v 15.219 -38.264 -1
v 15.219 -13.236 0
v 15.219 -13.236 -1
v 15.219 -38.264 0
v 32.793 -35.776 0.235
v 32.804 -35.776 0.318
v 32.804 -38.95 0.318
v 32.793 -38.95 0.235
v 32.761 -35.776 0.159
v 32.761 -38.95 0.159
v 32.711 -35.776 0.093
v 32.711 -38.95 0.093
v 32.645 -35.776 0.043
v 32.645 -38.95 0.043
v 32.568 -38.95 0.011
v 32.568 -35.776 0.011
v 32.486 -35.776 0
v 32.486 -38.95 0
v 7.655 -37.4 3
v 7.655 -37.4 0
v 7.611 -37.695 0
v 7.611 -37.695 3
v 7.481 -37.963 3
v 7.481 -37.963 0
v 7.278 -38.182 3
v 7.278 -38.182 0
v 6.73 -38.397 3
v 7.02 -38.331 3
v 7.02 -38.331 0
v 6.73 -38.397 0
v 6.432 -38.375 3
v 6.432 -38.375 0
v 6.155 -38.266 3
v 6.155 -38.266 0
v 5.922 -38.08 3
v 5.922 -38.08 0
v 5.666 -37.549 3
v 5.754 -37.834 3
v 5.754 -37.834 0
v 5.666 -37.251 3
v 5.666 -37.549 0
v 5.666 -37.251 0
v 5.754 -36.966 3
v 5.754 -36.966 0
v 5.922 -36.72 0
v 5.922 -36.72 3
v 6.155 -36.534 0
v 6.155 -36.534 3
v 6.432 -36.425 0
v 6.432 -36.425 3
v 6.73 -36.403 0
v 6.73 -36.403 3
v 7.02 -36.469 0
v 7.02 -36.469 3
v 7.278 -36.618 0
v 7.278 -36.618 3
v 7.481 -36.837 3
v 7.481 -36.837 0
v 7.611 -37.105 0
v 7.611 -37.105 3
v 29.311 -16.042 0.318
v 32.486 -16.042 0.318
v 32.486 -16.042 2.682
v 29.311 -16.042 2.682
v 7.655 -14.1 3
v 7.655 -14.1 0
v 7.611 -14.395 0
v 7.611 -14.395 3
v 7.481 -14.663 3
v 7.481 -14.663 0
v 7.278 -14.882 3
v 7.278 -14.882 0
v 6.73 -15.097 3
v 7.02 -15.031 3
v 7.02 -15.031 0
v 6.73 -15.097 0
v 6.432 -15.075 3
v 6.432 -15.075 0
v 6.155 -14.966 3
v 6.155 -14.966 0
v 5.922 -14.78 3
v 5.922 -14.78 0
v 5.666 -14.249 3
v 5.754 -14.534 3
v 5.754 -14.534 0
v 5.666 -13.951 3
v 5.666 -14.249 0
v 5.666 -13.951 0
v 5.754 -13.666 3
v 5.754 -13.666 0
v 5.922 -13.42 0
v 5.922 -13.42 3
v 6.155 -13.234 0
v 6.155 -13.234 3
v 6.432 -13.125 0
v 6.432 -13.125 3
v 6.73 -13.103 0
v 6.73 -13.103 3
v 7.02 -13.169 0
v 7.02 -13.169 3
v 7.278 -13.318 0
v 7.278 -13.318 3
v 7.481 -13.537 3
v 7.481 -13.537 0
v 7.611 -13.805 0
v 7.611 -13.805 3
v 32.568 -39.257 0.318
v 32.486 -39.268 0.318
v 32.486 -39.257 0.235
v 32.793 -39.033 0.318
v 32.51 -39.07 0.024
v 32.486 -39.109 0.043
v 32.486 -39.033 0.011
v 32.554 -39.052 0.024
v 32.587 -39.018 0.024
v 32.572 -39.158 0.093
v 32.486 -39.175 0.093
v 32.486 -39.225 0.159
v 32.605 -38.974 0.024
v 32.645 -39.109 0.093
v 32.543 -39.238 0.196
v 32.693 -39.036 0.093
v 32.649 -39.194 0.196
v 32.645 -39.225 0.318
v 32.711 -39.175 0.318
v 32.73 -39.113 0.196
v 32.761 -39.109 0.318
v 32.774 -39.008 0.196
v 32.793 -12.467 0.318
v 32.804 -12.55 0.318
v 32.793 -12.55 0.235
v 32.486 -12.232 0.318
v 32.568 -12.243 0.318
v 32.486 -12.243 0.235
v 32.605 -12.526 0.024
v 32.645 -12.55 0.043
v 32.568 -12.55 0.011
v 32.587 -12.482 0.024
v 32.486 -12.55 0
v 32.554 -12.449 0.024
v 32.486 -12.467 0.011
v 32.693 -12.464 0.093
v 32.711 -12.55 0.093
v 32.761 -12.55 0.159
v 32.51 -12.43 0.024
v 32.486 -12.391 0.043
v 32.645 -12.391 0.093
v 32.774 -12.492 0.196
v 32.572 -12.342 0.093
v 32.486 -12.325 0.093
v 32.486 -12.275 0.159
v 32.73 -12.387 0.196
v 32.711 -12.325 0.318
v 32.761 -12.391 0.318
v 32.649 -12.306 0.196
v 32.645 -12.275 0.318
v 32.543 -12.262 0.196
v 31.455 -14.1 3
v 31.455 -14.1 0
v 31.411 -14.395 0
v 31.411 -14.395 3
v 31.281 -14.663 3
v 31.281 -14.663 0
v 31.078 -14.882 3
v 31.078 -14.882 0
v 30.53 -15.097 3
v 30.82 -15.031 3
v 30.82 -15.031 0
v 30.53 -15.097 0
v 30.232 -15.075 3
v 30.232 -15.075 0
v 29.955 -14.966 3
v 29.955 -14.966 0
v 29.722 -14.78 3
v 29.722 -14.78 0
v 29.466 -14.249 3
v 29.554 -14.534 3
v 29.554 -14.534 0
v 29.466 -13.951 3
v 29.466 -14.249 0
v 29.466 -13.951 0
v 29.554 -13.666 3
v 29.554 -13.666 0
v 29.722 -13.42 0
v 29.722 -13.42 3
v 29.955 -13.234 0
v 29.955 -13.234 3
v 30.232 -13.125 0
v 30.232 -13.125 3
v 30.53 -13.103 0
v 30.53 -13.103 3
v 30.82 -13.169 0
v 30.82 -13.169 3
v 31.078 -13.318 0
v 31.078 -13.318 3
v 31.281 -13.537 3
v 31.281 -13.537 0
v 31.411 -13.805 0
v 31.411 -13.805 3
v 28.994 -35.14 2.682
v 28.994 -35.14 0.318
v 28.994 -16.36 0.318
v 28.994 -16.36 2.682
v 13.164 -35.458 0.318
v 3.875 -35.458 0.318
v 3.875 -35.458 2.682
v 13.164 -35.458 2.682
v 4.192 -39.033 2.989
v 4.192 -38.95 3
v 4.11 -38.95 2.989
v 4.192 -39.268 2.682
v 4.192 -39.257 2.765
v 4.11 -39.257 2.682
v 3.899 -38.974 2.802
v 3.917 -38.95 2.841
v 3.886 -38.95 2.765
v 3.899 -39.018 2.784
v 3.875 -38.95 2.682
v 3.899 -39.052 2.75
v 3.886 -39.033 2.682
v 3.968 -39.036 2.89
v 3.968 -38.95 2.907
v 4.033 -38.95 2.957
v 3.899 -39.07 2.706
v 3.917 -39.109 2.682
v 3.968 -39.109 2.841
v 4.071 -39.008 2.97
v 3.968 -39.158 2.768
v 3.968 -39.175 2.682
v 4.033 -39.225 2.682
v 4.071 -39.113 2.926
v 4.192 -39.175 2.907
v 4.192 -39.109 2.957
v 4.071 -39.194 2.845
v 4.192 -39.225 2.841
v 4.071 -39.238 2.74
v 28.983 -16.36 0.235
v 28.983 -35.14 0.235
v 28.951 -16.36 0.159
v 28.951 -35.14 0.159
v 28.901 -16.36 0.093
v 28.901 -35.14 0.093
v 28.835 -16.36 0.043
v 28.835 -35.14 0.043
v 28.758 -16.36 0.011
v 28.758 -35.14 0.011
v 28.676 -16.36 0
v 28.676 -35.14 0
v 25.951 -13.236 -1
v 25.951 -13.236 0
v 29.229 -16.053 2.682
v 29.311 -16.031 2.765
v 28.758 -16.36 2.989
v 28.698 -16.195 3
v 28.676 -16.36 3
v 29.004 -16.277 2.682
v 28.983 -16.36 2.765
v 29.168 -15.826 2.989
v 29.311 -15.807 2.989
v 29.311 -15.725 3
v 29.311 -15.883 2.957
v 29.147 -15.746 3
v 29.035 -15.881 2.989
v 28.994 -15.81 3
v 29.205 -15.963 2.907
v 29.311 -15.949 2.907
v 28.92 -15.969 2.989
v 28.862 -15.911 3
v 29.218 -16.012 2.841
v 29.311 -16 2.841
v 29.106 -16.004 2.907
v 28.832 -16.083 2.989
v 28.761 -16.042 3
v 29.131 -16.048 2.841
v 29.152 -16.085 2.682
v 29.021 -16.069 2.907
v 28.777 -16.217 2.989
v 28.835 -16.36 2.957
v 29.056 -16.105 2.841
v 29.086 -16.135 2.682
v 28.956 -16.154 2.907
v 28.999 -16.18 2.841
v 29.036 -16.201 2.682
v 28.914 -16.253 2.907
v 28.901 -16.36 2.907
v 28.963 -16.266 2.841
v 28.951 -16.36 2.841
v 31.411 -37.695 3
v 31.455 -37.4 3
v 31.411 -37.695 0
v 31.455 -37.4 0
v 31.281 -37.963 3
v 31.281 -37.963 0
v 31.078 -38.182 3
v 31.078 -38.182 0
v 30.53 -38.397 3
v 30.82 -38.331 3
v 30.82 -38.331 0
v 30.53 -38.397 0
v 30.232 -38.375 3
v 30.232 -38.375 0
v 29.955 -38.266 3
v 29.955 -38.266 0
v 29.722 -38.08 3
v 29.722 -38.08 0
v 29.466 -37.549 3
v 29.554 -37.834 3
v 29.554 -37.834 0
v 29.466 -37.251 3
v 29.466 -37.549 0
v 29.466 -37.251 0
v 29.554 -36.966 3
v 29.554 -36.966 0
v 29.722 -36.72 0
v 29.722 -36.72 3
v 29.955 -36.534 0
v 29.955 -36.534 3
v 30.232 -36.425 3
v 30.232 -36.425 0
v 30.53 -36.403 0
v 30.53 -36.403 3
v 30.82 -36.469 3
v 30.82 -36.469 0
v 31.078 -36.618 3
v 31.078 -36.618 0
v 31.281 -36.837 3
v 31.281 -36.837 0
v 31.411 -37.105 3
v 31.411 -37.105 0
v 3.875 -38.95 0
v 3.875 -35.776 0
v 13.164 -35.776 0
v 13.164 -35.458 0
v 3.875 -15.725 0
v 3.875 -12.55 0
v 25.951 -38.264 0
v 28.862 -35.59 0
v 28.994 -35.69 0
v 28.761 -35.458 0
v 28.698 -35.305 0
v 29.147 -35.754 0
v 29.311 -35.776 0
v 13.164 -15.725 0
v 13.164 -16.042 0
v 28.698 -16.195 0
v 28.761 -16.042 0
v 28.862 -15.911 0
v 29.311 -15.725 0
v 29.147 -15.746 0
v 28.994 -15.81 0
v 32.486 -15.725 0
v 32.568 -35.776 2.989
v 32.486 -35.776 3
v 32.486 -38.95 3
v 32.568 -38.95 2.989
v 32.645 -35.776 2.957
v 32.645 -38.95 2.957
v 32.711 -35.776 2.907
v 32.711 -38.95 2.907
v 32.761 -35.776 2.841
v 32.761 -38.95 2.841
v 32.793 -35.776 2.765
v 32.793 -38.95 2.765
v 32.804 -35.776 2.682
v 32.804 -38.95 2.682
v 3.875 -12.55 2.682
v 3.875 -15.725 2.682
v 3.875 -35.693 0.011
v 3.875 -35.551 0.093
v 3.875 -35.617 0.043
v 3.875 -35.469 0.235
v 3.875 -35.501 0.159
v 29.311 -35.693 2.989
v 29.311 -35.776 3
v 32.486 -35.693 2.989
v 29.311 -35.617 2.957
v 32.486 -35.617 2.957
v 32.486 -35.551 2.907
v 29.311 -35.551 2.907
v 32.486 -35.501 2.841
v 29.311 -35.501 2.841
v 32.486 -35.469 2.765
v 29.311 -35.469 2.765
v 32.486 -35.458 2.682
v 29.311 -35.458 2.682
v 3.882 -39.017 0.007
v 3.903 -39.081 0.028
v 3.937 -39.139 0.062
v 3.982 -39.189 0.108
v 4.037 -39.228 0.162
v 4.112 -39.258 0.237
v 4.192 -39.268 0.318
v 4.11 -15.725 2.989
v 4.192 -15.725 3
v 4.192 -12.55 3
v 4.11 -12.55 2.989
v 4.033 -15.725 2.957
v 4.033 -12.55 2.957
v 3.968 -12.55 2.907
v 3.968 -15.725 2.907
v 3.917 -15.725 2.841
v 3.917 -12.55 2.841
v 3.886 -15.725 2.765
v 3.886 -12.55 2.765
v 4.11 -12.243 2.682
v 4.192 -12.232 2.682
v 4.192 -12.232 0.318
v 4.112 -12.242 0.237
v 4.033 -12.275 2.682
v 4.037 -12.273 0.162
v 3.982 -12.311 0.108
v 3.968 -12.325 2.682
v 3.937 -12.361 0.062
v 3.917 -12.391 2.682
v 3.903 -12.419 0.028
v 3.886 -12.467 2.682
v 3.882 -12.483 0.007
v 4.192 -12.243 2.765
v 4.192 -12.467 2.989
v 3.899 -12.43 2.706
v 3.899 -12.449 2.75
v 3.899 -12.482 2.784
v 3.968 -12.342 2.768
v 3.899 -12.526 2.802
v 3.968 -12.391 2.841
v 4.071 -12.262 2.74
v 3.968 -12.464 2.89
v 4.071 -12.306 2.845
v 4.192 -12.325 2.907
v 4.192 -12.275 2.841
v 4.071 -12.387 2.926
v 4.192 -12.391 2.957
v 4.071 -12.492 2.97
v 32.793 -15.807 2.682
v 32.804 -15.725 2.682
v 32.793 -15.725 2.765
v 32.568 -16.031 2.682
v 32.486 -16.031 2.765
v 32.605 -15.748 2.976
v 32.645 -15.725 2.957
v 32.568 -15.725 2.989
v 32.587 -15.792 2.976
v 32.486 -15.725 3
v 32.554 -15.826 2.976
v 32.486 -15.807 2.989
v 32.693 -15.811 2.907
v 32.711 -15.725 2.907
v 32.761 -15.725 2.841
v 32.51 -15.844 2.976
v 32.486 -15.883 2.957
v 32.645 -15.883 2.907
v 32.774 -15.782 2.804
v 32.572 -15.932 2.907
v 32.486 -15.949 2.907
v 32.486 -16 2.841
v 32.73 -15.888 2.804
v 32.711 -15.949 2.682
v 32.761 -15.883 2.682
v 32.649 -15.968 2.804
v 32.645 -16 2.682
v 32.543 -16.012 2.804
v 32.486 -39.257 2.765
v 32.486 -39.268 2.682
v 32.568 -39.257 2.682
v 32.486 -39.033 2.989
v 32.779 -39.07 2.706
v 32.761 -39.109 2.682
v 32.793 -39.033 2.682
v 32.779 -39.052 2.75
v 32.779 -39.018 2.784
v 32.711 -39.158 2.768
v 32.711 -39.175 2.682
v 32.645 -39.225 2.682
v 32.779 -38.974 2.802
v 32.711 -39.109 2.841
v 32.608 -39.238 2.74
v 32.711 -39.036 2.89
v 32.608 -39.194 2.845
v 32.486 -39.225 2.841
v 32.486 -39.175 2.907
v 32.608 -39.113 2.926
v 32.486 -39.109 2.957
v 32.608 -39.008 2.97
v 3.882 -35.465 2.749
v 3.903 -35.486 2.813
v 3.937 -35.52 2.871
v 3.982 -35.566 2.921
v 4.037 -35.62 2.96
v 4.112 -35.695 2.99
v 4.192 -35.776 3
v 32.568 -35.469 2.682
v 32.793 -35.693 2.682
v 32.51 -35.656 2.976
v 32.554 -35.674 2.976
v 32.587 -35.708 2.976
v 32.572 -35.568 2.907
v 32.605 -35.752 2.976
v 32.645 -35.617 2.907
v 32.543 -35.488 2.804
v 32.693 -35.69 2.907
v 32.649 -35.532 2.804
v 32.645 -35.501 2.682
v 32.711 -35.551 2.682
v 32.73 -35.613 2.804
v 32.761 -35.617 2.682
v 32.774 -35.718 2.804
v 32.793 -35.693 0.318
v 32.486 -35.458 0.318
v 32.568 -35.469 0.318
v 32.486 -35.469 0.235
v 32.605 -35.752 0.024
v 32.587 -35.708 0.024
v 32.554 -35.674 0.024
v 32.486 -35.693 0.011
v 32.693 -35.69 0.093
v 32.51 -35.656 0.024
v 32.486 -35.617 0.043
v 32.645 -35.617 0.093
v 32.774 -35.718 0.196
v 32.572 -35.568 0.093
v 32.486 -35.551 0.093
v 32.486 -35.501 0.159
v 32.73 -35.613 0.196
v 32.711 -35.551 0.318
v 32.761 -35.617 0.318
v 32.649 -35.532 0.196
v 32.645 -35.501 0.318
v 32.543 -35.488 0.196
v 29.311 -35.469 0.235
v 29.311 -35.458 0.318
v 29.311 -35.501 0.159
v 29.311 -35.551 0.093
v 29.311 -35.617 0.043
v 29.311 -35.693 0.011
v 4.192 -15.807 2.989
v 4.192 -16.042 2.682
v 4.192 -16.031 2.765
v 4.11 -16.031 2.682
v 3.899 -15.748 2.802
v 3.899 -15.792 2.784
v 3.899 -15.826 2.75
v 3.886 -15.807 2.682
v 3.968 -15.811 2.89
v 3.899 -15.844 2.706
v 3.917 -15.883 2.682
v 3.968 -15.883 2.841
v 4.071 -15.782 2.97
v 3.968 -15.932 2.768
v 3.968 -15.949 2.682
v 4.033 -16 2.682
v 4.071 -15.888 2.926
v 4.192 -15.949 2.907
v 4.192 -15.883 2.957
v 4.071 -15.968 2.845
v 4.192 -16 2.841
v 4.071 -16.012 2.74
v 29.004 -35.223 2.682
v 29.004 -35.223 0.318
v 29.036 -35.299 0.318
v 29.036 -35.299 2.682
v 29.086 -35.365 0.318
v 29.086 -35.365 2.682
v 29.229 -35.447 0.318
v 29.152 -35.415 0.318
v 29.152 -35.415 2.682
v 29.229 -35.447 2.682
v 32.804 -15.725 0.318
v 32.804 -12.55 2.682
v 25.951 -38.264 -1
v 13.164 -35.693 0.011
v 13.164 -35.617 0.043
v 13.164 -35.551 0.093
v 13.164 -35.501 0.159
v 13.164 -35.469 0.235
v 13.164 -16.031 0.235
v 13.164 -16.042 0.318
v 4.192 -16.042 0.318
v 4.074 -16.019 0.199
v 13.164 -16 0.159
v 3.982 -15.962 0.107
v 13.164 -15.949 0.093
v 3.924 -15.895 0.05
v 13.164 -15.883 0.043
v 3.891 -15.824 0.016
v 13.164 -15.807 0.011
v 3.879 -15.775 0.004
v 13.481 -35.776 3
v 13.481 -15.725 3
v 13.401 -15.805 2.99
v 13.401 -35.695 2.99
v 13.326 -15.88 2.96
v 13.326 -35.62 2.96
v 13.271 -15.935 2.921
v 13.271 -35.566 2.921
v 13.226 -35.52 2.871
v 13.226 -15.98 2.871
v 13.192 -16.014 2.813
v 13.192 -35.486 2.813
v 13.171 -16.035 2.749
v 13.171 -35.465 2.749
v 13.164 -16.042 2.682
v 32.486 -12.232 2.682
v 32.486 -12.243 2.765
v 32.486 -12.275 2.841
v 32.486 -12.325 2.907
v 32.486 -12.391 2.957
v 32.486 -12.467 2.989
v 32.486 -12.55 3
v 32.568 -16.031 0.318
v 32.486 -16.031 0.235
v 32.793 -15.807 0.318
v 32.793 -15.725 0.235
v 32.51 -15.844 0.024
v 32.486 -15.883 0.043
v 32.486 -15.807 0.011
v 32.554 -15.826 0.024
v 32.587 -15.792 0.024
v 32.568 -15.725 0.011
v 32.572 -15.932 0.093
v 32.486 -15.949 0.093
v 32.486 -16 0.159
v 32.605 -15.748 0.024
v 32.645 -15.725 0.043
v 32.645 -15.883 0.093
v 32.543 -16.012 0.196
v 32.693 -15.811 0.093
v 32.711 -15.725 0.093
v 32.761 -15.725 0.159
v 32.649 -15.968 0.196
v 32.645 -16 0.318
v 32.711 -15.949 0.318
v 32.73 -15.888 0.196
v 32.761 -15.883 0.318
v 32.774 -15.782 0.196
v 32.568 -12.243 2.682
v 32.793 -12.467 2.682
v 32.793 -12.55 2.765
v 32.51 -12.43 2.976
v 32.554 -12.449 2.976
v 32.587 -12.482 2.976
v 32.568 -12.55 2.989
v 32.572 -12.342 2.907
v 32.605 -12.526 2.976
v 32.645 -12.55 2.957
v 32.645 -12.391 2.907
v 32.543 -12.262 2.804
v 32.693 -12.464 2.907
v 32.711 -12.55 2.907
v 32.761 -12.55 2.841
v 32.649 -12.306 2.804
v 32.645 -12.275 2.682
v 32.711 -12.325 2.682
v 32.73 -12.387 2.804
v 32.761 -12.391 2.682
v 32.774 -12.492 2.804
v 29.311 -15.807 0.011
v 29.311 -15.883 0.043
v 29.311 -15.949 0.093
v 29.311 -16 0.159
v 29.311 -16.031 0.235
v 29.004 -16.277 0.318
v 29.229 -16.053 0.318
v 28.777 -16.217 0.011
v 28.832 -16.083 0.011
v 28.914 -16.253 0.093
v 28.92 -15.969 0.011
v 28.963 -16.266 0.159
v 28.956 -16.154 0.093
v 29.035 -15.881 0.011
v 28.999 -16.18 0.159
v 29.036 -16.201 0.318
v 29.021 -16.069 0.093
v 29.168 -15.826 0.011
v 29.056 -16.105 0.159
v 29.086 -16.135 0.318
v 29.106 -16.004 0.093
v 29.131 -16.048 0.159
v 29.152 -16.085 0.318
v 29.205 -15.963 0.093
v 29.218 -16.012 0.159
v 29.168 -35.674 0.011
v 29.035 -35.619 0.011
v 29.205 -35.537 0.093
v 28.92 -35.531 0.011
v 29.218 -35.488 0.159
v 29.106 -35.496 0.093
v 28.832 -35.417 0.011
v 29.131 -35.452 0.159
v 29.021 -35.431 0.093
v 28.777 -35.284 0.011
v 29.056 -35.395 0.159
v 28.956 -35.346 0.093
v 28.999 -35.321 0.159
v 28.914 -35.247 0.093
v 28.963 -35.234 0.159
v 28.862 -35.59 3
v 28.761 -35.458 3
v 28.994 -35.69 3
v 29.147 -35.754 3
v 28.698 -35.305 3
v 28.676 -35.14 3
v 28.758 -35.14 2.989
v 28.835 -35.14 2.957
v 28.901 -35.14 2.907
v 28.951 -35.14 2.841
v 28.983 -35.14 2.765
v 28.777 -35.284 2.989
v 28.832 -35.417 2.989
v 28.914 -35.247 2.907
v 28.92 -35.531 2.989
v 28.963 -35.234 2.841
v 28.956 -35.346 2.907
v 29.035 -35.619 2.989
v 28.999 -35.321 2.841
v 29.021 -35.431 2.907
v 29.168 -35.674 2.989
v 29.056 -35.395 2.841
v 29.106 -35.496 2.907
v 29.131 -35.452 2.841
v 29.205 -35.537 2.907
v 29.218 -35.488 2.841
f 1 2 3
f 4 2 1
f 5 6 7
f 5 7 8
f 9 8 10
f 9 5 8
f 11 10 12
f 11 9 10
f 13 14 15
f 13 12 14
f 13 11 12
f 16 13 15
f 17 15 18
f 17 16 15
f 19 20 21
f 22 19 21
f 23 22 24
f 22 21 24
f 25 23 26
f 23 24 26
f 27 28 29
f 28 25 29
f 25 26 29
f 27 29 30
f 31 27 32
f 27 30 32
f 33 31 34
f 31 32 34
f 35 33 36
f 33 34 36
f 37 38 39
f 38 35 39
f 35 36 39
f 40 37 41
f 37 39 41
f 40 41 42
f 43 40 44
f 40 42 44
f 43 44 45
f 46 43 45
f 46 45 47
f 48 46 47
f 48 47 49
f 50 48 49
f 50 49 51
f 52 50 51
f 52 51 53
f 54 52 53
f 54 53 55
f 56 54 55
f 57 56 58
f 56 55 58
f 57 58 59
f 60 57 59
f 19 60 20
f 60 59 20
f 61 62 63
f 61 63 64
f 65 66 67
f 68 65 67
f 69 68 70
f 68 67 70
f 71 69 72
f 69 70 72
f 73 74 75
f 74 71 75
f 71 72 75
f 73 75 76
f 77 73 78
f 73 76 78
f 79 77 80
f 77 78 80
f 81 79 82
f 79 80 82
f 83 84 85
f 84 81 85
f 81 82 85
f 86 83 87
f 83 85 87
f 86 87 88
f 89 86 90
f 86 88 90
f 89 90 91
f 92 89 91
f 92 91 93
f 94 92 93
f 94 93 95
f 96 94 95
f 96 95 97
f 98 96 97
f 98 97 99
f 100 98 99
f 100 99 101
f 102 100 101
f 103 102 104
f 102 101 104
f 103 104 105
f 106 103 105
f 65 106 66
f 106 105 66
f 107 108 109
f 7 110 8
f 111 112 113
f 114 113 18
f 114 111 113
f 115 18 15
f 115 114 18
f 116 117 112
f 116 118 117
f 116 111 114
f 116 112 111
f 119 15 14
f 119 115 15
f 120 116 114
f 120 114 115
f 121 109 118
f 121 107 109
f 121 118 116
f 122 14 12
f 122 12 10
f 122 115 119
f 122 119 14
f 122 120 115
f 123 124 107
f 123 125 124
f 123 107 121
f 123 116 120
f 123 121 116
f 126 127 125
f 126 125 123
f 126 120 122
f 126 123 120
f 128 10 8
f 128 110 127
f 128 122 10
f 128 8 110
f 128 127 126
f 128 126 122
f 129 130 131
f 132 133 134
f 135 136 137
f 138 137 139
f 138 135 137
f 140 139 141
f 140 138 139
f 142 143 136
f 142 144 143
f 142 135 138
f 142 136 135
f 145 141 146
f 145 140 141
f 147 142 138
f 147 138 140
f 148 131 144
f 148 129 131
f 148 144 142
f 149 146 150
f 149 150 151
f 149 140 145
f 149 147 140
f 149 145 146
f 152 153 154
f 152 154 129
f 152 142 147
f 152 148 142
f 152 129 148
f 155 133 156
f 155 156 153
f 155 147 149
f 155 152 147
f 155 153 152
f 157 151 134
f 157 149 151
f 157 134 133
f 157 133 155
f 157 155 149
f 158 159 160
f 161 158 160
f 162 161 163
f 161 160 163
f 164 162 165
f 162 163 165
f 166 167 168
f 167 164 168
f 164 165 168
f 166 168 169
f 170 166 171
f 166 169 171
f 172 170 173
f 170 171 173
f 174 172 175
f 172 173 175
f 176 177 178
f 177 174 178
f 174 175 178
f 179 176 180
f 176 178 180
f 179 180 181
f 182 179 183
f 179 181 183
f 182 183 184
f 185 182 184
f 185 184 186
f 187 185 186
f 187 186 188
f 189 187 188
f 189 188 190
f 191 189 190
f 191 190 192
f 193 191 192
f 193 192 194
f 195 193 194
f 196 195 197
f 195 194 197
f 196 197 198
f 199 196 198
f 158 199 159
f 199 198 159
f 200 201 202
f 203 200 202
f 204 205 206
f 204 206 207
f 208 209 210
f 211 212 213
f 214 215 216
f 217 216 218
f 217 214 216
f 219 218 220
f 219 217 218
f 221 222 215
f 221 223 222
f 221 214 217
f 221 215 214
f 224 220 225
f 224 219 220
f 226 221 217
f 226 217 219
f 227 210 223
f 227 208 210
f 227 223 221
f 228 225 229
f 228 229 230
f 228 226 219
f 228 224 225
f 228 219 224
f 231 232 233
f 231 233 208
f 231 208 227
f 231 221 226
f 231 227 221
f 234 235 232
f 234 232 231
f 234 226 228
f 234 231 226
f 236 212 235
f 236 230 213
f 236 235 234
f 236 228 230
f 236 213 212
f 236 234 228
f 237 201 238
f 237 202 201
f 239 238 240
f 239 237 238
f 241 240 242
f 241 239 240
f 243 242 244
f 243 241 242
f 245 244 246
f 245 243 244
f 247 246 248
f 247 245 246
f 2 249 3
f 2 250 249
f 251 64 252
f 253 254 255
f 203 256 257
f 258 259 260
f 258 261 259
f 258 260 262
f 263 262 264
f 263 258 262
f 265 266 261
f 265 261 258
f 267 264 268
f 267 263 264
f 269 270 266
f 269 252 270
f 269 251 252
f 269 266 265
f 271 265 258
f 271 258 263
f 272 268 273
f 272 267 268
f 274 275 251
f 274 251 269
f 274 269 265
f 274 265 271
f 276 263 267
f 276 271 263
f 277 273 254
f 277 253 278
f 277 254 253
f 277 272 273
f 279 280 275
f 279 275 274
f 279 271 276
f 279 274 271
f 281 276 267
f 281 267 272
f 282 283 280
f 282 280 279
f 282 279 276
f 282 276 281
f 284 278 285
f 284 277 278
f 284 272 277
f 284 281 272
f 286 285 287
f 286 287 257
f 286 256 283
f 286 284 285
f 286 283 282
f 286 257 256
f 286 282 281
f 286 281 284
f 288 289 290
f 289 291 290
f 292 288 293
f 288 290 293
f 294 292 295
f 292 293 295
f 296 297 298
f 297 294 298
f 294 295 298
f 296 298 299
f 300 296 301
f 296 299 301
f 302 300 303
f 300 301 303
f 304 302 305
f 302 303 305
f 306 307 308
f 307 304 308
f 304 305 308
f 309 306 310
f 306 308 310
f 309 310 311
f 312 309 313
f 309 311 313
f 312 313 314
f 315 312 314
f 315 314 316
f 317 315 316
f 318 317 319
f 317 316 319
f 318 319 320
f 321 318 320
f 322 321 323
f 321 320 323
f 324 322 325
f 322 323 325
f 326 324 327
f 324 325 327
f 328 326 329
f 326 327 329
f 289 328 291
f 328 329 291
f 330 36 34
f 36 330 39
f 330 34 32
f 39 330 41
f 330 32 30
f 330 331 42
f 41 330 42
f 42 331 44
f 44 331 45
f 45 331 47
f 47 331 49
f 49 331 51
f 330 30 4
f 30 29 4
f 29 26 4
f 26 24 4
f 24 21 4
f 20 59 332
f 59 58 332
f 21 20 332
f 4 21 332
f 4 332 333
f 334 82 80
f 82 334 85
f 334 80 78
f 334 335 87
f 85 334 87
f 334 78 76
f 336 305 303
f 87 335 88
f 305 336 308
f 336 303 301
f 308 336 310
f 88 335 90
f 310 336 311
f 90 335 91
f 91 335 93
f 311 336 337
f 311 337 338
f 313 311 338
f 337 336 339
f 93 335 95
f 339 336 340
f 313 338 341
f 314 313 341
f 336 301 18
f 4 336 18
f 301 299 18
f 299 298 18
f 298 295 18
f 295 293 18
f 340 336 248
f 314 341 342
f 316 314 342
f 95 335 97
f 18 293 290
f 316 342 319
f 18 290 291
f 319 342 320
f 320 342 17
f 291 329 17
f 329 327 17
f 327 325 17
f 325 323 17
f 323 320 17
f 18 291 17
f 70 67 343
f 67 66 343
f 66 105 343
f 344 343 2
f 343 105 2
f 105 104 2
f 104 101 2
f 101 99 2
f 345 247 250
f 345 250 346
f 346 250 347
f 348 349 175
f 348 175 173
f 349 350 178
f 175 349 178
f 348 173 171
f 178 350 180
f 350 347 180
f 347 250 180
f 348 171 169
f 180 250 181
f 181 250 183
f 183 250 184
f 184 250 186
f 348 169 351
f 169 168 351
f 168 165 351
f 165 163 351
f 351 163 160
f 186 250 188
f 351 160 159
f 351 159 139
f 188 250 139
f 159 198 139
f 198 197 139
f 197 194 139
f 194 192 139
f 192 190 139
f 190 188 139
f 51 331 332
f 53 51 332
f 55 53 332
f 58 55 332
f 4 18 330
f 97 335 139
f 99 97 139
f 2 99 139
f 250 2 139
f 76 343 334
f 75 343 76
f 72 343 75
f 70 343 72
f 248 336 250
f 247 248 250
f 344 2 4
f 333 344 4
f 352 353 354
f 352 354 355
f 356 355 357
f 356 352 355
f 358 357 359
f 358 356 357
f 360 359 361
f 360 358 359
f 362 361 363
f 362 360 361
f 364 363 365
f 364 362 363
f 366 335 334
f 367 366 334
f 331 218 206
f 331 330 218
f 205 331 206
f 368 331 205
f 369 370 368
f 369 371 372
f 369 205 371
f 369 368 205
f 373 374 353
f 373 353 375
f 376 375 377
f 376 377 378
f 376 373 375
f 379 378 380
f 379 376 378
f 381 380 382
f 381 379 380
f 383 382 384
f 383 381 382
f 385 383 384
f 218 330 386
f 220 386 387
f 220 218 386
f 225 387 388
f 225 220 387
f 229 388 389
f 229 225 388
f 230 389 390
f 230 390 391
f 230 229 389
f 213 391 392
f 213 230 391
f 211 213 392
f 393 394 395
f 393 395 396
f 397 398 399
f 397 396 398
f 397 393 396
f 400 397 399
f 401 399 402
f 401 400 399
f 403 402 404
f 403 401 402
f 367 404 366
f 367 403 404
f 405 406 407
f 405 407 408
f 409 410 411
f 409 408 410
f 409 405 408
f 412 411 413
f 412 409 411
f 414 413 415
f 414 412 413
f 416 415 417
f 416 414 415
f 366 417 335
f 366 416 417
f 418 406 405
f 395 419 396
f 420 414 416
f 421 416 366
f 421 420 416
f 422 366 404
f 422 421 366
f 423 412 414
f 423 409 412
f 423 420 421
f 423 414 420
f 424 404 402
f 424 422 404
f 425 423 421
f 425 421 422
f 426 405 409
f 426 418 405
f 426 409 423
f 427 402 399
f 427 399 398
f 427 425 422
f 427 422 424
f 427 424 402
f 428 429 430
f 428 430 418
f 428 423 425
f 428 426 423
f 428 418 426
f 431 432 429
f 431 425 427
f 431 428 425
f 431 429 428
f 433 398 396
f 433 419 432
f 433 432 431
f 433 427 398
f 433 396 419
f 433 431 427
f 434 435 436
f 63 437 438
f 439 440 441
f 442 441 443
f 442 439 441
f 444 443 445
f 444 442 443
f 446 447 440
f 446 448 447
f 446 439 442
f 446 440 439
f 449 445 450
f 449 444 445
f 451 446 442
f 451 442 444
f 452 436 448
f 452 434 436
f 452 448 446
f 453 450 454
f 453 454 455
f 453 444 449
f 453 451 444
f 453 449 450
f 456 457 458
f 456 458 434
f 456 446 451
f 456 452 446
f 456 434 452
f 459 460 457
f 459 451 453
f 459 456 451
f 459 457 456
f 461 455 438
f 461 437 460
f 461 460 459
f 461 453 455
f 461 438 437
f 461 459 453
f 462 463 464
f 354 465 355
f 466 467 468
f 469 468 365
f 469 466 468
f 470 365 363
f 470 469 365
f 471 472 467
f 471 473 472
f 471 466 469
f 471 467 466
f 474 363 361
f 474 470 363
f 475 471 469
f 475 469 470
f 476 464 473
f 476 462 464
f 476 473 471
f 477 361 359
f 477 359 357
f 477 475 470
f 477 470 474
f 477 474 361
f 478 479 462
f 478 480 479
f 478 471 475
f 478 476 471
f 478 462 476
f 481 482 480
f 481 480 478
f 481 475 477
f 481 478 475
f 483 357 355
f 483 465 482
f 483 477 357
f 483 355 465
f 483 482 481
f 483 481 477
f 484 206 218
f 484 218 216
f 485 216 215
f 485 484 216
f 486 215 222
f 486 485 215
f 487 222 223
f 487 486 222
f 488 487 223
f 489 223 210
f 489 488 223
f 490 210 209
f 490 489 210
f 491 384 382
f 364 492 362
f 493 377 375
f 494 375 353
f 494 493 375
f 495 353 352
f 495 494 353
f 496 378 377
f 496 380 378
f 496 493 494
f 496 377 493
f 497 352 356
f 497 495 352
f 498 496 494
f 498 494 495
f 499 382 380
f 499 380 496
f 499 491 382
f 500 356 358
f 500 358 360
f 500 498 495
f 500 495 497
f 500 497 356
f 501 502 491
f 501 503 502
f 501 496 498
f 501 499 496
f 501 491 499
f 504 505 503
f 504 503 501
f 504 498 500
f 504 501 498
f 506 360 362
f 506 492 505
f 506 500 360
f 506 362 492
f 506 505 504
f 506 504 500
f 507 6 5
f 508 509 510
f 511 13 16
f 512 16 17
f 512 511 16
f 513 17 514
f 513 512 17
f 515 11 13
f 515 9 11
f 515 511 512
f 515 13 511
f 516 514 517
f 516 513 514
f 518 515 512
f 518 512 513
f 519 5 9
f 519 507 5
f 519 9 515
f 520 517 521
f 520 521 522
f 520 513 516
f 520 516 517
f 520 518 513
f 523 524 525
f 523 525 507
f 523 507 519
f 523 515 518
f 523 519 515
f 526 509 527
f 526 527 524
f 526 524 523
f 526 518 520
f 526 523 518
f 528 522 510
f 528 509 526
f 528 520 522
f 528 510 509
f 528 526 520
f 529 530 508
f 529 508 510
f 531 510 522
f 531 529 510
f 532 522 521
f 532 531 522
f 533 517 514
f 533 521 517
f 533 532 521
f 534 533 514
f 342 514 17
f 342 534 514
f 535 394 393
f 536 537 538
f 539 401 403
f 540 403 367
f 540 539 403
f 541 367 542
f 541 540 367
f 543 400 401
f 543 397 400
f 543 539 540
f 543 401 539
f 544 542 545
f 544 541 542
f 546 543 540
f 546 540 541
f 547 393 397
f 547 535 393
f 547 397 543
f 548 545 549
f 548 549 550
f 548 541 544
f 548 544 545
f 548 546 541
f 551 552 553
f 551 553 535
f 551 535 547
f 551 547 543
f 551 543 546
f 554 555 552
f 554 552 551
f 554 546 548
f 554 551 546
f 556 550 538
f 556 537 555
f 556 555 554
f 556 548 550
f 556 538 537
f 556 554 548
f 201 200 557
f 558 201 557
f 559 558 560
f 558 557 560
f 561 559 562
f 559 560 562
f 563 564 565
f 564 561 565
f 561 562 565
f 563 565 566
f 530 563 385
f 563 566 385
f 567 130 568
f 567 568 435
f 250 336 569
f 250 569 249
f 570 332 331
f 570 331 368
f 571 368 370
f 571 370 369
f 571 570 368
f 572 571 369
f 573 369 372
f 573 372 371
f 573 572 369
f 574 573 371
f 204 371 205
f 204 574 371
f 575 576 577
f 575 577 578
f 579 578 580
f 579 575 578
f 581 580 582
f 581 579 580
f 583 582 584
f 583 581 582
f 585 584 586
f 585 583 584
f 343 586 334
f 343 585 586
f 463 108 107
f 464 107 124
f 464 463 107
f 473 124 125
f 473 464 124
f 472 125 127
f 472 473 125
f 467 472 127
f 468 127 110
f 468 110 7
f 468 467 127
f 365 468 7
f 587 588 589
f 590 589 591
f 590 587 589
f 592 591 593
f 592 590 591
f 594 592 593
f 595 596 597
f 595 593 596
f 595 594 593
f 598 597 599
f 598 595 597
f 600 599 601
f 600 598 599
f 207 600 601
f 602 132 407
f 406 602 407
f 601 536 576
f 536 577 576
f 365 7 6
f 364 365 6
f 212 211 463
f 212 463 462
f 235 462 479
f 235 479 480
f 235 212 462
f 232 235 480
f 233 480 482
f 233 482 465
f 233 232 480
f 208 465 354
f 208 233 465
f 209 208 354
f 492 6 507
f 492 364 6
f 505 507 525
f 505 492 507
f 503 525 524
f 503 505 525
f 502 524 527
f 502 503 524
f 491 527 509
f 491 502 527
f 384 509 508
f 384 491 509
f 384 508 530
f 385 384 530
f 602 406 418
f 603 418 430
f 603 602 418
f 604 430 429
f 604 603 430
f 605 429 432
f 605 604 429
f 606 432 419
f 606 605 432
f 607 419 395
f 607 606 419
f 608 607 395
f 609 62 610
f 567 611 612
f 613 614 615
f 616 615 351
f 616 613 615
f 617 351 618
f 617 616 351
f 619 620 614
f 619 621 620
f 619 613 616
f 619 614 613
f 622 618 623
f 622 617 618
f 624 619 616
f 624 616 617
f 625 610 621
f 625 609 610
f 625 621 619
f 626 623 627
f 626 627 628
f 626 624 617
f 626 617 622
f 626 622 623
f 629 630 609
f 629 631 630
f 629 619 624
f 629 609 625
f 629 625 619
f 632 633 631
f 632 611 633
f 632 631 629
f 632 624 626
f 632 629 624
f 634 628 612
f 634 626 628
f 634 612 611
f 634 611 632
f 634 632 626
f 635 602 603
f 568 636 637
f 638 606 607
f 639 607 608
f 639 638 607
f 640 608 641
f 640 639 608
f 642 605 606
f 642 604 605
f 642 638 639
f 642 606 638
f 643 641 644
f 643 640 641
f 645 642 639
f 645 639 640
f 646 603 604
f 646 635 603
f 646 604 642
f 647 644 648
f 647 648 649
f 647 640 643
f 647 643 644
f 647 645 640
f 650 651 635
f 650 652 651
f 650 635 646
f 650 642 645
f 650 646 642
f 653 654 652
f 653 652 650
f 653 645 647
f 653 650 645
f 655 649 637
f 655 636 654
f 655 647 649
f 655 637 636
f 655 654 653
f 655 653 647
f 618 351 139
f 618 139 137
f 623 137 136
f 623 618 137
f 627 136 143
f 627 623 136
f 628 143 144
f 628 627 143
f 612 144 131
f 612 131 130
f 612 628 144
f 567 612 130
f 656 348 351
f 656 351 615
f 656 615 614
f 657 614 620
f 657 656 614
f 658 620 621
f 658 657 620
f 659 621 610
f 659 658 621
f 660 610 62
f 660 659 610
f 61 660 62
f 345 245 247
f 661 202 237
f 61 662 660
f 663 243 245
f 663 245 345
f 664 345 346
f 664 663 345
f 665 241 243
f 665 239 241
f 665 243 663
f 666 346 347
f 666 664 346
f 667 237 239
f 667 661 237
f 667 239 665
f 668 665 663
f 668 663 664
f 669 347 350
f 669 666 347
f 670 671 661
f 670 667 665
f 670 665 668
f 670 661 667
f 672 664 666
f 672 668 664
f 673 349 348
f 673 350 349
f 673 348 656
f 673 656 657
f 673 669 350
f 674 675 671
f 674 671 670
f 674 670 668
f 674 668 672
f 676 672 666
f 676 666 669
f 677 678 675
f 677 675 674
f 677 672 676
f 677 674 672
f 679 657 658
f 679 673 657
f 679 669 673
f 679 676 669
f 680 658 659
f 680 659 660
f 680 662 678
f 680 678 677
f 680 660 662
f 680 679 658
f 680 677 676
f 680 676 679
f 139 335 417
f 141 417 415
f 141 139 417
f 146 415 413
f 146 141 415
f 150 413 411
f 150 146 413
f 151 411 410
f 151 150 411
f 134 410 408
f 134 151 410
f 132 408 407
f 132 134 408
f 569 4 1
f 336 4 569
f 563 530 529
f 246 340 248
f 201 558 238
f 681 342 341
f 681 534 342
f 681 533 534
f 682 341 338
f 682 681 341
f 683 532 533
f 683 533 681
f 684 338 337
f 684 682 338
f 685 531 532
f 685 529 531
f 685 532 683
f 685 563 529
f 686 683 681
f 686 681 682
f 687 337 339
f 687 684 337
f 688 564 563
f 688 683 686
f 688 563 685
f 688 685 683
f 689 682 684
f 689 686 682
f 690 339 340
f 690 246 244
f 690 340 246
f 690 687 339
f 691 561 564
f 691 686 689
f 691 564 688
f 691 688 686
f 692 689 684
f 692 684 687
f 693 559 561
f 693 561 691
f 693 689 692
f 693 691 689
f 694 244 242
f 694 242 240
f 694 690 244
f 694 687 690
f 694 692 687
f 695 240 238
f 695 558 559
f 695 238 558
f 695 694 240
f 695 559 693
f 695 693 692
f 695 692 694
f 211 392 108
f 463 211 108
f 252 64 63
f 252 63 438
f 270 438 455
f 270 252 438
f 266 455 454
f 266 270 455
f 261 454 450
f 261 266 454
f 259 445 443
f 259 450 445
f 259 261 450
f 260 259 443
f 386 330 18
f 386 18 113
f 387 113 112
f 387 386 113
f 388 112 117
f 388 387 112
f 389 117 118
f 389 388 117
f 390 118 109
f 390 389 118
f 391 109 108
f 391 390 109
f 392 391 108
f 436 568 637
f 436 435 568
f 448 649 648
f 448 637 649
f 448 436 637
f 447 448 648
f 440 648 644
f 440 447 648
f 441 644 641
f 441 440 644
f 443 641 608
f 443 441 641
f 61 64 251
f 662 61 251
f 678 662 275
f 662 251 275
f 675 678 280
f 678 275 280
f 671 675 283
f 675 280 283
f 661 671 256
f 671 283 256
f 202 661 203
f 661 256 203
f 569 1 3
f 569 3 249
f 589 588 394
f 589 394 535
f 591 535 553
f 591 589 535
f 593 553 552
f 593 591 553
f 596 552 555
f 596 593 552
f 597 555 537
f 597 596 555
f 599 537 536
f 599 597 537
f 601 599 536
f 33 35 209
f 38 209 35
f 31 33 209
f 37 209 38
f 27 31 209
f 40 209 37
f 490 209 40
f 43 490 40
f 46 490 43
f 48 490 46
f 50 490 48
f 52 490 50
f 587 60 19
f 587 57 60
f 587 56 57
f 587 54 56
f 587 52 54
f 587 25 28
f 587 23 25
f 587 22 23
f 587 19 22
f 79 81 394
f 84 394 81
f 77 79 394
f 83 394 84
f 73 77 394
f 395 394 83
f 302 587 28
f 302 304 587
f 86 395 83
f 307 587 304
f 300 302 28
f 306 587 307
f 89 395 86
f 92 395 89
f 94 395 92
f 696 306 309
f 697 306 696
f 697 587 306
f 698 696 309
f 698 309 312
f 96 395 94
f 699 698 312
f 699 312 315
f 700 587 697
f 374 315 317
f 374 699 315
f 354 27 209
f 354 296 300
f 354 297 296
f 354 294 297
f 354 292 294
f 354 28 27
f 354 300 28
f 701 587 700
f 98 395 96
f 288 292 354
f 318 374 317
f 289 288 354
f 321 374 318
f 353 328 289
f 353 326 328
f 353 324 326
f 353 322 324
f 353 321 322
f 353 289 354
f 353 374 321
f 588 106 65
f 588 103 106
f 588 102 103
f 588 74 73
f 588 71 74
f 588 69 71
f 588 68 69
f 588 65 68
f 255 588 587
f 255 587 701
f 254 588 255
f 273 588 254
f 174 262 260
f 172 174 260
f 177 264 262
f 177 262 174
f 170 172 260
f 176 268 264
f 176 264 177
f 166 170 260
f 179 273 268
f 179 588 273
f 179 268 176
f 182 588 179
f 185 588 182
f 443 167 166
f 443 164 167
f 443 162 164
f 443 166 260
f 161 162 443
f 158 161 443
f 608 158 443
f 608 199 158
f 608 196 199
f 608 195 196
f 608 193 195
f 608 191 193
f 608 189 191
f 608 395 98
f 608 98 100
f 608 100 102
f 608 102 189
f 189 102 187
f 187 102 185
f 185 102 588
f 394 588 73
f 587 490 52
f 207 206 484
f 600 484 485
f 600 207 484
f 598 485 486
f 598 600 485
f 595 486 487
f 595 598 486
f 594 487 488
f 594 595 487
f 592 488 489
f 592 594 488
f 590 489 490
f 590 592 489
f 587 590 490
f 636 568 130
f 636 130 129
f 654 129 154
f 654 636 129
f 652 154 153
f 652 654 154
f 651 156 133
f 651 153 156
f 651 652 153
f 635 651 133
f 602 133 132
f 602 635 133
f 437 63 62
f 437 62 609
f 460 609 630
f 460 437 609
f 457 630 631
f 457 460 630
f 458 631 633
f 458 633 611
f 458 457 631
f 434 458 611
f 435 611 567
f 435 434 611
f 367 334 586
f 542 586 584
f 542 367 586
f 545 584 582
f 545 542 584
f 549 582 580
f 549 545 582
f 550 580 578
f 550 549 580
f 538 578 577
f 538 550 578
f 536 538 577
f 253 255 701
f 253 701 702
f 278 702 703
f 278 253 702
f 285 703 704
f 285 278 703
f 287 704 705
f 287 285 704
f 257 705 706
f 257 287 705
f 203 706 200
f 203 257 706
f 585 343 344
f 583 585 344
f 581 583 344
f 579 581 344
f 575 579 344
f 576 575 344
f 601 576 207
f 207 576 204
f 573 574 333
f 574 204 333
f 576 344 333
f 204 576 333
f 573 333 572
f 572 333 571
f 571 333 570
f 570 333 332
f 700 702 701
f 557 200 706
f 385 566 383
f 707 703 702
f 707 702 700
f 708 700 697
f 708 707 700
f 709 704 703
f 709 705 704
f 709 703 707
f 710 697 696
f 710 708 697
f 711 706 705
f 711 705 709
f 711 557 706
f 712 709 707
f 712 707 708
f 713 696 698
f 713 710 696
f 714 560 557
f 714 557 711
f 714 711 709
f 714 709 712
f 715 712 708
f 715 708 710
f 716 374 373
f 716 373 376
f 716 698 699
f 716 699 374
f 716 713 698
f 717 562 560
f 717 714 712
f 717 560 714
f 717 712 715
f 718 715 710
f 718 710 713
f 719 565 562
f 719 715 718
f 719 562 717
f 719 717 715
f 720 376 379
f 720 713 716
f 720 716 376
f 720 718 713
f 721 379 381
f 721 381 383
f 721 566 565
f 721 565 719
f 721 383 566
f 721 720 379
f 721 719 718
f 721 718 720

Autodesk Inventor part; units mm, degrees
ref_plane "YZ Plane" through (0, 0, 0) normal (1, 0, 0) x (0, 1, 0)
ref_plane "XZ Plane" through (0, 0, 0) normal (0, 1, 0) x (-1, 0, 0)
ref_plane "XY Plane" through (0, 0, 0) normal (0, 0, 1) x (1, 0, 0)
ref_plane "Work Plane1" through (0, 0, 0) normal (0, 0, 1) x (1, 0, 0)
sketch "Sketch1" plane through (0, 0, 0) normal (0, 0, 1) x (1, 0, 0)
  line L0 (26.085, -12.7501) -> (26.085, -38.7501) projected
  line L1 (15.085, -12.7501) -> (26.085, -12.7501) projected
  line L2 (15.085, -38.7501) -> (15.085, -12.7501) projected
  line L3 (26.085, -38.7501) -> (15.085, -38.7501) projected
  line L4 (26.085, -25.7501) -> (15.085, -25.7501)
  line L5 (20.585, -38.7501) -> (20.585, -12.7501)
  line L6 (15.2194, -38.2641) -> (25.9506, -38.2641)
  line L7 (25.9506, -38.2641) -> (25.9506, -13.236)
  line L8 (25.9506, -13.236) -> (15.2194, -13.236)
  line L9 (15.2194, -13.236) -> (15.2194, -38.2641)
  line L10 (15.2194, -38.2641) -> (25.9506, -13.236) construction
  line L11 (25.9506, -38.2641) -> (15.2194, -13.236) construction
  point P0 (0, 0)
  point P1 (20.585, -25.7501)
extrude "Extrusion1" add sketch "Sketch1" against normal blind 1 contours L7 L6 L5 L4 | L4 L5 L8 L7 | L5 L4 L9 L8 | L5 L6 L9 L4
sketch "Sketch2" plane through (0, 0, 0) normal (0, 0, 1) x (1, 0, 0)
  line L0 (15.2194, -13.236) -> (15.2194, -38.2641) projected
  line L1 (15.2194, -38.2641) -> (25.9506, -38.2641) projected
  line L2 (25.9506, -38.2641) -> (25.9506, -13.236) projected
  line L3 (25.9506, -13.236) -> (15.2194, -13.236) projected
  line L4 (13.1635, -39.268) -> (28.9935, -39.268)
  line L5 (28.9935, -39.268) -> (28.9935, -12.2321)
  line L6 (28.9935, -12.2321) -> (13.1635, -12.2321)
  line L7 (13.1635, -12.2321) -> (13.1635, -39.268)
  line L8 (13.1635, -39.268) -> (28.9935, -12.2321) construction
  line L9 (28.9935, -39.268) -> (13.1635, -12.2321) construction
  line L10 (28.9935, -12.2321) -> (32.8035, -12.2321)
  line L11 (32.8035, -12.2321) -> (32.8035, -16.0421)
  line L12 (32.8035, -16.0421) -> (28.9935, -16.0421)
  line L13 (28.9935, -39.268) -> (32.8035, -39.268)
  line L14 (32.8035, -39.268) -> (32.8035, -35.458)
  line L15 (32.8035, -35.458) -> (28.9935, -35.458)
  line L16 (13.1635, -12.2321) -> (3.8747, -12.2321)
  line L17 (3.8747, -12.2321) -> (3.8747, -16.0421)
  line L18 (3.8747, -16.0421) -> (13.1635, -16.0421)
  line L19 (13.1635, -39.268) -> (3.8747, -39.268)
  line L20 (3.8747, -39.268) -> (3.8747, -35.458)
  line L21 (3.8747, -35.458) -> (13.1635, -35.458)
  circle A0 centre (30.455, -14.1001) radius 1 projected
  circle A1 centre (30.455, -37.4001) radius 1 projected
  circle A2 centre (6.655, -37.4001) radius 1 projected
  circle A3 centre (6.655, -14.1001) radius 1 projected
  point P0 (0, 0)
  point P1 (21.0785, -25.7501)
  dimension "d2" = 3.81
  dimension "d3" = 3.81
  dimension "d4" = 3.81
  dimension "d5" = 3.81
  dimension "d6" = 6.0858
  dimension "d7" = 4.1119
  dimension "d8" = 27.0359
  dimension "d9" = 3.81
  dimension "d10" = 3.81
  dimension "d11" = 2.0078
  dimension "d12" = 44.1517
extrude "Extrusion2" add sketch "Sketch2" along normal blind 3 contours L3 L2 L1 L0 | L7 L6 L5 L4 | L19 L20 L21 L7 | L5 L15 L14 L13 | L18 L17 L16 L7 | L5 L10 L11 L12
fillet "Fillet1" radius 0.3175 30 edges at (32.8035, -16.0421, 1.5) (32.8035, -12.2321, 1.5) (30.8985, -16.0421, 3) (18.3391, -12.2321, 3) (28.9935, -25.7501, 3) (28.9935, -16.0421, 1.5) (30.8985, -16.0421, 0) (28.9935, -25.7501, 0) (32.8035, -35.458, 1.5) (30.8985, -35.458, 3) (18.3391, -39.268, 3) (32.8035, -39.268, 1.5) (32.8035, -37.363, 3) (32.8035, -14.1371, 3) (28.9935, -35.458, 1.5) (30.8985, -35.458, 0) (18.3391, -39.268, 0) (3.8747, -39.268, 1.5) (3.8747, -37.363, 3) (8.5191, -35.458, 3) (13.1635, -25.7501, 3) (8.5191, -16.0421, 3) (3.8747, -16.0421, 1.5) (3.8747, -14.1371, 3) (18.3391, -12.2321, 0) (3.8747, -12.2321, 1.5) (8.5191, -16.0421, 0) (8.5191, -35.458, 0) (32.8035, -37.363, 0) (32.8035, -14.1371, 0)
properties part number "OLED"
